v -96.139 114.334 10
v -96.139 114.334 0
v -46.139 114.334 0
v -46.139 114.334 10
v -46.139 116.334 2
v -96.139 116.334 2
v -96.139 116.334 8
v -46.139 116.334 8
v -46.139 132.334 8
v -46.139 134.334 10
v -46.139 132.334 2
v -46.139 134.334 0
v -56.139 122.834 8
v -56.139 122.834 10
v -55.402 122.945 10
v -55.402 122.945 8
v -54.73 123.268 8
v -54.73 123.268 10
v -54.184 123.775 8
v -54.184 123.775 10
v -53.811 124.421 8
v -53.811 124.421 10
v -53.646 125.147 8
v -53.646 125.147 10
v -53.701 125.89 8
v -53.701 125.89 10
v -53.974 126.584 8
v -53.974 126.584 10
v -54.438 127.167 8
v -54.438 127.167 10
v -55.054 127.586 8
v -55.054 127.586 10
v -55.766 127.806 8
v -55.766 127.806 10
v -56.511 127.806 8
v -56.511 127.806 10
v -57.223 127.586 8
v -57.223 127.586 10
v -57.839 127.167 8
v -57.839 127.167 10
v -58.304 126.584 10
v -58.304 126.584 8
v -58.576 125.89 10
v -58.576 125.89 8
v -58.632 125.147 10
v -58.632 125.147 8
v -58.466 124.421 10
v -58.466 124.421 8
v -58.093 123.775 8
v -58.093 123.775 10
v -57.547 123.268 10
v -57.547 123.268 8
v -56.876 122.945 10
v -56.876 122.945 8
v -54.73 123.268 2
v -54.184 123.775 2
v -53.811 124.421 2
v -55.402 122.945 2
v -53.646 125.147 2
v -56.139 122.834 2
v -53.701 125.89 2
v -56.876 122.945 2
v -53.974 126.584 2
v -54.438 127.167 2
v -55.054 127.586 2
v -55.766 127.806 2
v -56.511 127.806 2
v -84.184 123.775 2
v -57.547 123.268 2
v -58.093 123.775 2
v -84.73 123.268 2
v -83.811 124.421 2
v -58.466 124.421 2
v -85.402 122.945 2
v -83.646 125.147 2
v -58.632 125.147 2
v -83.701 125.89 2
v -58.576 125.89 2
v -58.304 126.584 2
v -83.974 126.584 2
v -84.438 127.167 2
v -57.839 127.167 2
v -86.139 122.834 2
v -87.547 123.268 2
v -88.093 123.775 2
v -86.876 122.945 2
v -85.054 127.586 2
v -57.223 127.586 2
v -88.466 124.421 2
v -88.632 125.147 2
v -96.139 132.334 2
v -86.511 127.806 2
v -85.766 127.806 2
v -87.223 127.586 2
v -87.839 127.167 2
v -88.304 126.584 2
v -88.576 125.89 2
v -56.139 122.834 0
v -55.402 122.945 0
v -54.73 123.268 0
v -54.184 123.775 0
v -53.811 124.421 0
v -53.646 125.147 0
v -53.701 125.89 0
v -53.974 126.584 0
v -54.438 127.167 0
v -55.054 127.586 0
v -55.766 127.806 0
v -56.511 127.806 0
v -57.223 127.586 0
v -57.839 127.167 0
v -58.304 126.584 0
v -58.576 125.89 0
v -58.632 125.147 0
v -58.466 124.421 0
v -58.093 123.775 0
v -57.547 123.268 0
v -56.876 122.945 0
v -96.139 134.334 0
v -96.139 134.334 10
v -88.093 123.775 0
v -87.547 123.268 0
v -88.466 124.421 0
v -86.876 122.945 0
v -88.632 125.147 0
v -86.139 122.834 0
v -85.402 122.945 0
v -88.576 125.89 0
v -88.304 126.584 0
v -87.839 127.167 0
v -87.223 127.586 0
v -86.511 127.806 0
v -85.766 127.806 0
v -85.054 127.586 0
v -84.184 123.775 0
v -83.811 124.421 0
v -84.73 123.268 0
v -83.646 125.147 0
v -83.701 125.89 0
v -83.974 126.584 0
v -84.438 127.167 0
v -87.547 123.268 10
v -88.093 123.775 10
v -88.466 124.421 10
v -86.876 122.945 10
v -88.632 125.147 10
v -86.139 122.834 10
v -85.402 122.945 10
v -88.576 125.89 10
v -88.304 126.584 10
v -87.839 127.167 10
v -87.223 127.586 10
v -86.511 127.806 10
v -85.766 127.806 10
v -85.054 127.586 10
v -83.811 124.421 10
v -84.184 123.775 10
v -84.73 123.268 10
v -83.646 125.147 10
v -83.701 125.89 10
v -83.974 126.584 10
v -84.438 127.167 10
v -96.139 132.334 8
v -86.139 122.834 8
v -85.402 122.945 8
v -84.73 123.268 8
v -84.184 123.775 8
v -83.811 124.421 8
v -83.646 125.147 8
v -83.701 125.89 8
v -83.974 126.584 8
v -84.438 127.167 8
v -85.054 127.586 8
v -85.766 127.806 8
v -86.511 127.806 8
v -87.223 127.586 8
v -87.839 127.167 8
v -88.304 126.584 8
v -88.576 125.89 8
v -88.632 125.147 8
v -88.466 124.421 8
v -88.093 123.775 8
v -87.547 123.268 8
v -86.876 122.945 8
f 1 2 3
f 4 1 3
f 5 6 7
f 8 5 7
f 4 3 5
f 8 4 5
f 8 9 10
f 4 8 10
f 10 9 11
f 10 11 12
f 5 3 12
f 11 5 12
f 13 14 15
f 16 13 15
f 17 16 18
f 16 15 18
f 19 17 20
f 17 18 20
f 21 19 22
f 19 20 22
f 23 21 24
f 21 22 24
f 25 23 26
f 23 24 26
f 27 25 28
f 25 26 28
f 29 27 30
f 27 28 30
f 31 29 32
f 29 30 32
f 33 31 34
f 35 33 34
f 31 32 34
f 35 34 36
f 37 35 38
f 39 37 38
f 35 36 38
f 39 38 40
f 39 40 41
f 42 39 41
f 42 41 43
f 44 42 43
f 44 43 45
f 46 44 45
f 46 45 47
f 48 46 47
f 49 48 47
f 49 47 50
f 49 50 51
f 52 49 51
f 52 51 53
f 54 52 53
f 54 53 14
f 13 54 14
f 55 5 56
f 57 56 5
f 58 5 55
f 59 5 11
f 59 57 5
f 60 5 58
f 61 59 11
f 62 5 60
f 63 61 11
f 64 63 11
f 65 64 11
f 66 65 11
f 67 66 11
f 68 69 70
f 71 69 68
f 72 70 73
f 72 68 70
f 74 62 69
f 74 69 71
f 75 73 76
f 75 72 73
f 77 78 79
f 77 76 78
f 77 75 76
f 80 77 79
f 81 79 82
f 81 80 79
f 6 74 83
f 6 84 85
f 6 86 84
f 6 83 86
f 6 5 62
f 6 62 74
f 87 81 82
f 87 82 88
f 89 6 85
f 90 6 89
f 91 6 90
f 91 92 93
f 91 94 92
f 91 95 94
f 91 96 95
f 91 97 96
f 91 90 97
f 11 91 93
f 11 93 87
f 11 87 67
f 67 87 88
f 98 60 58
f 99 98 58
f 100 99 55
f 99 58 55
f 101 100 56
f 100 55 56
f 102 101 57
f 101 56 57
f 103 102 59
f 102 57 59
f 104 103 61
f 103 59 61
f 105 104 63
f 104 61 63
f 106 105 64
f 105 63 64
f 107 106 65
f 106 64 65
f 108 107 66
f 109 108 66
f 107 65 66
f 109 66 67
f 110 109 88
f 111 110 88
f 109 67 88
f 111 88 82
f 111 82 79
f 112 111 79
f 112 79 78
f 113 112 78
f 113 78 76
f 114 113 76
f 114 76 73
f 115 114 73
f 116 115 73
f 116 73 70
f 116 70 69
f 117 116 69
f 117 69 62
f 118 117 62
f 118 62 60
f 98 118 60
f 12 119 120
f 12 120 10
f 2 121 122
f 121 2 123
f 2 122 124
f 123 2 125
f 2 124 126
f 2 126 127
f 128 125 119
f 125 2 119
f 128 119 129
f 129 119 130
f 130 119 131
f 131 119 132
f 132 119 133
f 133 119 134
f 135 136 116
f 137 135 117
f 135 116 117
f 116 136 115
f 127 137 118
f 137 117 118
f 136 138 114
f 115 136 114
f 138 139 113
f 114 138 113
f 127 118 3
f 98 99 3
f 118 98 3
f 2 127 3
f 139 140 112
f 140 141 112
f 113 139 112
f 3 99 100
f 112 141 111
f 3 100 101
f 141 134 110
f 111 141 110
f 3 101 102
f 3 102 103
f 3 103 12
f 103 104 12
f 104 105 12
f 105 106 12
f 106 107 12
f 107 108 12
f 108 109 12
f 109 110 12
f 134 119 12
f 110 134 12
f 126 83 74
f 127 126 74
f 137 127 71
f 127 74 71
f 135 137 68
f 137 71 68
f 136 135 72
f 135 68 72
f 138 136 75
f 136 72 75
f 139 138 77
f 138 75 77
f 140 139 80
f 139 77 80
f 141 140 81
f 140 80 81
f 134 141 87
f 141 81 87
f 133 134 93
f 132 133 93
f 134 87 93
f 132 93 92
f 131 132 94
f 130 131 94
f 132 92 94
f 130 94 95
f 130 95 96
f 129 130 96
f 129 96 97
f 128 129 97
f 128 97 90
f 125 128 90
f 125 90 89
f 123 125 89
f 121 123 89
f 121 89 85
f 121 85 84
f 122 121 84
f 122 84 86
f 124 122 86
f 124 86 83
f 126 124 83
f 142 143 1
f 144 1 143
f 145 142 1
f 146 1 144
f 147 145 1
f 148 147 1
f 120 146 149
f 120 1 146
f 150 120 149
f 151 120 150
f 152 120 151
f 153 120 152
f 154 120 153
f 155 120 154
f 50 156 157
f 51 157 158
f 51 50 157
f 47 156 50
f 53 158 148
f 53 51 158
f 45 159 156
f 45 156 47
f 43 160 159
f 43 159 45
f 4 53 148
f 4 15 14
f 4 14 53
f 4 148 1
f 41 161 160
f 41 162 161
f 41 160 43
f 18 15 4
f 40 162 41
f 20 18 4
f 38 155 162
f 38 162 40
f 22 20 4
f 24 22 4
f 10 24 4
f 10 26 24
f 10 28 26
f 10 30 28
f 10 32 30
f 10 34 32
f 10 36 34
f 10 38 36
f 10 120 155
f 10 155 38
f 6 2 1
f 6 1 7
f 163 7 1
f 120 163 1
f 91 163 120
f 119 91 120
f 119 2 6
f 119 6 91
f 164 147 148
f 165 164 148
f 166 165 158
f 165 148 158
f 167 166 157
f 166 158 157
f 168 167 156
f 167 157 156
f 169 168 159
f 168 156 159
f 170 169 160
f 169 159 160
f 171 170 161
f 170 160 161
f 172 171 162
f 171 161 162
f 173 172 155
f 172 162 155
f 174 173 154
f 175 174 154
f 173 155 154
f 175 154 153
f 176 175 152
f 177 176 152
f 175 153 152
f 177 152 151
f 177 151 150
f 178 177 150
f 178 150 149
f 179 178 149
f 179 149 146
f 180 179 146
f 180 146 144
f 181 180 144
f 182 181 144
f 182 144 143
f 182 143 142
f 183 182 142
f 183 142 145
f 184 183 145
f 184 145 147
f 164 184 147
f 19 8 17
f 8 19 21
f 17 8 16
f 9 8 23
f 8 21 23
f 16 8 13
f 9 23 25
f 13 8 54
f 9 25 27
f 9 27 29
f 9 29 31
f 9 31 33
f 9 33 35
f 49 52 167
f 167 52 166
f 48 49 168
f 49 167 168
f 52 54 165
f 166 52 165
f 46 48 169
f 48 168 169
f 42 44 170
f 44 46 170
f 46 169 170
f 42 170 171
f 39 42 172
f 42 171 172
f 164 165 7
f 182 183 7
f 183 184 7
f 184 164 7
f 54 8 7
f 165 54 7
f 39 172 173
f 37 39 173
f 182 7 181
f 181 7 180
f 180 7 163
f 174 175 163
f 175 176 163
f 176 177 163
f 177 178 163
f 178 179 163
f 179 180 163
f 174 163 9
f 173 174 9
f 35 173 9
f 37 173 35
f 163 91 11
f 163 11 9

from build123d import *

# Parameters (mm, degrees)
SKETCH1_W          = 50
SKETCH1_H          = 20
EXTRUDE1_DEPTH     = 10
SKETCH2_W          = 6
SKETCH2_H          = 16
CUT_EXTRUDE1_DEPTH = 60
CUT_EXTRUDE2_DEPTH = 30


with BuildPart() as part:
    # Sketch1 → Extrude1 (new body)
    with BuildSketch(Plane.XY):
        with Locations((-71.138674094, 124.333988555)):
            Rectangle(SKETCH1_W, SKETCH1_H)
    extrude(amount=EXTRUDE1_DEPTH)

    # Sketch2 → Cut-Extrude1 (cut)
    with BuildSketch(Plane.ZY.offset(96.138674094)):
        with Locations((5, 124.333988555)):
            Rectangle(SKETCH2_W, SKETCH2_H)
    extrude(amount=-CUT_EXTRUDE1_DEPTH, mode=Mode.SUBTRACT)

    # Sketch3 → Cut-Extrude2 (cut)
    with BuildSketch(Plane.XY.offset(10)):
        with BuildLine():
            ThreePointArc((-56.138674094, 127.833988555), (-58.638674094, 125.333988555), (-56.138674094, 122.833988555))
            ThreePointArc((-56.138674094, 122.833988555), (-53.638674094, 125.333988555), (-56.138674094, 127.833988555))
        make_face()
        with BuildLine():
            ThreePointArc((-86.138674094, 127.833988555), (-88.638674094, 125.333988555), (-86.138674094, 122.833988555))
            ThreePointArc((-86.138674094, 122.833988555), (-83.638674094, 125.333988555), (-86.138674094, 127.833988555))
        make_face()
    extrude(amount=-CUT_EXTRUDE2_DEPTH, mode=Mode.SUBTRACT)


solid = part.part
